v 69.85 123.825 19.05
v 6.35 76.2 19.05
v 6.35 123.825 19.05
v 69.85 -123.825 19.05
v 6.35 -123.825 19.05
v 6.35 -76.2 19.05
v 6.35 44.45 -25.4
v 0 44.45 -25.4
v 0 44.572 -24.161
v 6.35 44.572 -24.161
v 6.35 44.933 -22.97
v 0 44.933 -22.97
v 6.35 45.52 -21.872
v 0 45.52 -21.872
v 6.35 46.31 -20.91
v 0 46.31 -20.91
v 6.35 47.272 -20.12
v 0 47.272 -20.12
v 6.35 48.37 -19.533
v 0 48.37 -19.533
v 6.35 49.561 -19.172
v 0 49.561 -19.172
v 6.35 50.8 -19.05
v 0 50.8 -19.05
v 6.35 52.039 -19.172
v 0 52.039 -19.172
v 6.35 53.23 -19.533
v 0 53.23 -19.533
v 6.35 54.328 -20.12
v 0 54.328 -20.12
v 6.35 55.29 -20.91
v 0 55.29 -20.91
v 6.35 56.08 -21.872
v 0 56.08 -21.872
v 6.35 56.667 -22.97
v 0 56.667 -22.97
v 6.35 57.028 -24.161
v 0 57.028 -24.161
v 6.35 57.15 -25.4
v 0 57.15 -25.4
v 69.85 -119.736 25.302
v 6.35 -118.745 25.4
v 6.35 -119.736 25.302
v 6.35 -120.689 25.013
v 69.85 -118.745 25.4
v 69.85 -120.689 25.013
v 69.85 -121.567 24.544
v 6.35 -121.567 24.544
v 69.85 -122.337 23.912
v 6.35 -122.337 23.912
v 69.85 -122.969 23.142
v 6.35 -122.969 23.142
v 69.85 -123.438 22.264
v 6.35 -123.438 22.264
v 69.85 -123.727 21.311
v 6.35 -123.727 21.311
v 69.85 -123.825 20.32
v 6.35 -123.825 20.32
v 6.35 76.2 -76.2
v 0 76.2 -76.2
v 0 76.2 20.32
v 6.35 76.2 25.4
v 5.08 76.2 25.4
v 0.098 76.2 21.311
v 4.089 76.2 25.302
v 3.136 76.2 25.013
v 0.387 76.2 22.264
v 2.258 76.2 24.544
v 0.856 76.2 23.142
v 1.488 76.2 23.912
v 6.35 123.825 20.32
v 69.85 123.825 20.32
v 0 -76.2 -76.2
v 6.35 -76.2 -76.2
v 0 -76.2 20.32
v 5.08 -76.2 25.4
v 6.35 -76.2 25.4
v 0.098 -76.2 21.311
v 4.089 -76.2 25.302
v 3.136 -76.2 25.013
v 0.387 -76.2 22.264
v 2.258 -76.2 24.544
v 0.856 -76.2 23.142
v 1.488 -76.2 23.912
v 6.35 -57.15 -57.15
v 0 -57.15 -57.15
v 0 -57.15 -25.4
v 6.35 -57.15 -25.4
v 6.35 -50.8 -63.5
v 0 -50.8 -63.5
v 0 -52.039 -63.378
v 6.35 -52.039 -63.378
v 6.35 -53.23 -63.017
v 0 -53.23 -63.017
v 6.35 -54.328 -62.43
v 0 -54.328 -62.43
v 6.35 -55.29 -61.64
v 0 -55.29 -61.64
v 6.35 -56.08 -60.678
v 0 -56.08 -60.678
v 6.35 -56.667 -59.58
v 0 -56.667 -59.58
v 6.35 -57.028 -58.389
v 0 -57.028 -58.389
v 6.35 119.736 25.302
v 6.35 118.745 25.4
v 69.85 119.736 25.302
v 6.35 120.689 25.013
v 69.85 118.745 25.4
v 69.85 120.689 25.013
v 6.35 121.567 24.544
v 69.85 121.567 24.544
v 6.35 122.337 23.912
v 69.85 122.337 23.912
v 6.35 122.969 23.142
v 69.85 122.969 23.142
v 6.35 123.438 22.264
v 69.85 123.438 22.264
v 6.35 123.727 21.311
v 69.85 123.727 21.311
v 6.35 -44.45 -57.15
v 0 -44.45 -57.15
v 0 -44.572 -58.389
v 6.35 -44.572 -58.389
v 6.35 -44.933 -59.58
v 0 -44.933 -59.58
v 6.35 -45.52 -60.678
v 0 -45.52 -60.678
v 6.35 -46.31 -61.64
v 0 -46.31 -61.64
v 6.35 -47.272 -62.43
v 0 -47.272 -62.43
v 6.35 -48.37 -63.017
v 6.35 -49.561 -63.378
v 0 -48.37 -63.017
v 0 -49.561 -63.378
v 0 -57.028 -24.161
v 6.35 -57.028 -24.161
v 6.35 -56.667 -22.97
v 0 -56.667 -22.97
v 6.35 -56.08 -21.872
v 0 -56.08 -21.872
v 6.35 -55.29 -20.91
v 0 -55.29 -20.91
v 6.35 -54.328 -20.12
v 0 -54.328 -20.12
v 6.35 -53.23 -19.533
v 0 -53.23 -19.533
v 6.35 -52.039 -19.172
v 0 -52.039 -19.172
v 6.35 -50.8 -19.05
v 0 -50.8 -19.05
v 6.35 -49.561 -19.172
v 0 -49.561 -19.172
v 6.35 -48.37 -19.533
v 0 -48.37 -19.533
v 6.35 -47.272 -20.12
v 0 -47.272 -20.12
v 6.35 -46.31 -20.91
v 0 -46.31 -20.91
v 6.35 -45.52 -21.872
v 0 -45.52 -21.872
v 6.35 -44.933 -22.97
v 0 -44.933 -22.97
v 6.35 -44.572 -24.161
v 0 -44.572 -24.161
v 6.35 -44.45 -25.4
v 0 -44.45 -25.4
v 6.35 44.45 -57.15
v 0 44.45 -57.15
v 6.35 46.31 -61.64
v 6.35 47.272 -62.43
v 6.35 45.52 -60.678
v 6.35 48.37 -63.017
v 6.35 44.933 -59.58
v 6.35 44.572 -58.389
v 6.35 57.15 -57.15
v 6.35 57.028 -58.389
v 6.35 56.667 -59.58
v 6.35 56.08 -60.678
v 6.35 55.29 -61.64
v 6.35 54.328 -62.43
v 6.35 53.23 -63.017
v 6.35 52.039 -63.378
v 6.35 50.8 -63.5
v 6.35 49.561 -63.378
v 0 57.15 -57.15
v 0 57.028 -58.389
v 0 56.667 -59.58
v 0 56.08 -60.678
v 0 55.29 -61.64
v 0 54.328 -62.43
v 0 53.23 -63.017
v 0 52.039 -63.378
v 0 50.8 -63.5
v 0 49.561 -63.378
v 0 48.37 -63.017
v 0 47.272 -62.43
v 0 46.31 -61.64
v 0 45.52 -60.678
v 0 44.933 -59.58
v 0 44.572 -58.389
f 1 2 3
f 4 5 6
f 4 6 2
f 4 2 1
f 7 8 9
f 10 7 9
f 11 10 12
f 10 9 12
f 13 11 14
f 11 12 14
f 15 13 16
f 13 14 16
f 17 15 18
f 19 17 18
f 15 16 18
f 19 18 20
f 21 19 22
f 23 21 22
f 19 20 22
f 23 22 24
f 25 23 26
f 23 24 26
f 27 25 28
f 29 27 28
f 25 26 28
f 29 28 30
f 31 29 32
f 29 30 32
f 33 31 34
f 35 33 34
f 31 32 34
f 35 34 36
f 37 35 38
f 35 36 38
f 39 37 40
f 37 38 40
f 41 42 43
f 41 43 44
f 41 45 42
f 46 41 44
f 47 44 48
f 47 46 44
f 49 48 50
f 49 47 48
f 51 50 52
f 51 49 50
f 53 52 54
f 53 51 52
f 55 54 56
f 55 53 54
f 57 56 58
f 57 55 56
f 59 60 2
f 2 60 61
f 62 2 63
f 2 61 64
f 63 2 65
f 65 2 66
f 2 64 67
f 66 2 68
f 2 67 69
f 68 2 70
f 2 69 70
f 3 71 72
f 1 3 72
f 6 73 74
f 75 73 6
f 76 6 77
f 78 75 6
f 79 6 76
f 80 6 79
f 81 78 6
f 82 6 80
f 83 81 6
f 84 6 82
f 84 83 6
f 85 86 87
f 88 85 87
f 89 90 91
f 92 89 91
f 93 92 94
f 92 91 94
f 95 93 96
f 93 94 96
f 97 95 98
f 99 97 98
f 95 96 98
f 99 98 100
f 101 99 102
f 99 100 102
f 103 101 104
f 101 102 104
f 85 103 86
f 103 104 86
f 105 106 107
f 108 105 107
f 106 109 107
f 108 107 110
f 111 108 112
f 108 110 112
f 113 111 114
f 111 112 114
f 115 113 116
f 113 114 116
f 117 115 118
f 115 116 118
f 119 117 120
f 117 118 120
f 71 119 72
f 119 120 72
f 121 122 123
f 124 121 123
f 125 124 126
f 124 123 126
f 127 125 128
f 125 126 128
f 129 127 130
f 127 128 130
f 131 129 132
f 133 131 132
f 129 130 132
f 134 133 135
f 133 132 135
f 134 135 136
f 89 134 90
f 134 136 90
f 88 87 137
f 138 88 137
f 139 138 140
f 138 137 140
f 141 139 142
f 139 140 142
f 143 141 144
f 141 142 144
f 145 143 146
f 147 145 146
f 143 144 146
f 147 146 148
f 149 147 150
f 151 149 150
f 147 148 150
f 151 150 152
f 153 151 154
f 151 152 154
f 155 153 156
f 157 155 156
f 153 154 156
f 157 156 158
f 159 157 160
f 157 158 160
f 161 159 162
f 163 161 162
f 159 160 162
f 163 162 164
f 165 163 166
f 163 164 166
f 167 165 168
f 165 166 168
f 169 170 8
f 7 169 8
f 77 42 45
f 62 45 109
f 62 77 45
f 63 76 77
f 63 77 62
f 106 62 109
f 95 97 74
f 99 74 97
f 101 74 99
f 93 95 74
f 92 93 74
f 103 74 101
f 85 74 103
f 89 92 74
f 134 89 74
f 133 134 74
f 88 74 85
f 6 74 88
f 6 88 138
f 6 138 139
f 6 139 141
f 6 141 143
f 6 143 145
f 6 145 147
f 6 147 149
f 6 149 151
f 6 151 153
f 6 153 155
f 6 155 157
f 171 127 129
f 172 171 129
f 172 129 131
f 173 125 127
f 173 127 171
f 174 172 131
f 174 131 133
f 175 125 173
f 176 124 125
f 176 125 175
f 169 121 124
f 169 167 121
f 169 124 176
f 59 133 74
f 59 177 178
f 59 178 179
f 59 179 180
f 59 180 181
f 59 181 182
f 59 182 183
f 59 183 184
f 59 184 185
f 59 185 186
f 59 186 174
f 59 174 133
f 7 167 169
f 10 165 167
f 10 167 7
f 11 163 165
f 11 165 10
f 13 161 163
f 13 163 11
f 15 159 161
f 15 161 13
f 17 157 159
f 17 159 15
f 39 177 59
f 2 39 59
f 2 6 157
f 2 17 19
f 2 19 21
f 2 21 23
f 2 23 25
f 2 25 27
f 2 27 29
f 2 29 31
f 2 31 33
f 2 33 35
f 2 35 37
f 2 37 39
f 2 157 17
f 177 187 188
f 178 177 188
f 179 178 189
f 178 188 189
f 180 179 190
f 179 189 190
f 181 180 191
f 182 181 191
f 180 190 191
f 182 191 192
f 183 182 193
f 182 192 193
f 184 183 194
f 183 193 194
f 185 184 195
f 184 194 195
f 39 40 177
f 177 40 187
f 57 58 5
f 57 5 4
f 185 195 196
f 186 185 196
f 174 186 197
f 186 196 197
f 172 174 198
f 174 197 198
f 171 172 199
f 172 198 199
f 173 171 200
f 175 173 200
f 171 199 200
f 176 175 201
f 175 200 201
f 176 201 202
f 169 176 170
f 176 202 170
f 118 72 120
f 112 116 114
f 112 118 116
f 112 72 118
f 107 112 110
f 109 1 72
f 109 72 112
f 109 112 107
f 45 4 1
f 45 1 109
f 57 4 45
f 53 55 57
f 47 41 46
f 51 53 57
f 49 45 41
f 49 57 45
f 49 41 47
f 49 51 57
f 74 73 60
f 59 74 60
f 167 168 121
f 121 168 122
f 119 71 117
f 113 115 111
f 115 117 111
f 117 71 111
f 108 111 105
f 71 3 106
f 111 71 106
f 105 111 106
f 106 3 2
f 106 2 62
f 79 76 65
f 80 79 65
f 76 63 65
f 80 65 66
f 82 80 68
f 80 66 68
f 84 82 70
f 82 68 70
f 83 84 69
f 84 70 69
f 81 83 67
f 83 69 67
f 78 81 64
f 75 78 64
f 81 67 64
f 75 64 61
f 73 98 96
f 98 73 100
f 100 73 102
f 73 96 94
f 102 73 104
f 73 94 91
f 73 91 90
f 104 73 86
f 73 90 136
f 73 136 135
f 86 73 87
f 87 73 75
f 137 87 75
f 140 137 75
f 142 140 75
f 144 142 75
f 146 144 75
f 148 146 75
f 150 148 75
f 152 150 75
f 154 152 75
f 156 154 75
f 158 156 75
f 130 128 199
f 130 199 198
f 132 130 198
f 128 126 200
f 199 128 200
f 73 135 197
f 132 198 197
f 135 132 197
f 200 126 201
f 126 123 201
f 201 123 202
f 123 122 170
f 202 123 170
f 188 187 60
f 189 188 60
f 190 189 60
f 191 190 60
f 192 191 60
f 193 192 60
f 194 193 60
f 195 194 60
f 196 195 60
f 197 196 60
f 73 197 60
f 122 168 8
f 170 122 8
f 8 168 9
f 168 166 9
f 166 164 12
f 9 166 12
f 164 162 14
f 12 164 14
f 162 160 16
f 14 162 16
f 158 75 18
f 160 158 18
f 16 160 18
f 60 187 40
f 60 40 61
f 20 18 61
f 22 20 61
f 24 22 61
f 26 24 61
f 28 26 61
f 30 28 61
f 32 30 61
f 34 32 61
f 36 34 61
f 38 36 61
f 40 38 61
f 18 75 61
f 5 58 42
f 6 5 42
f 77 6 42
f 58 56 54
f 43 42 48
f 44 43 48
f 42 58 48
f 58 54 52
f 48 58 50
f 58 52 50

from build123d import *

# Parameters (mm, degrees)
F6_W     = 63.5
F6_H     = 6.35
F0_DEPTH = 123.825
F3_W     = 152.4
F3_H     = 101.6
F4_DEPTH = 6.35
F5_R     = 5.08


with BuildPart() as f0:
    # F6 (on Front) → F0 (new body)
    with BuildSketch(Plane.XZ):
        with Locations((38.1, 22.225)):
            Rectangle(F6_W, F6_H)
    extrude(amount=F0_DEPTH)

    # F1: F0 across plane


with BuildPart() as f0_1:
    add(f0.part)
    add(f0.part.mirror(Plane.XZ))

    # F2: F0 across plane


with BuildPart() as f0_2:
    add(f0_1.part)
    add(f0_1.part.mirror(Plane.XZ))

    # F3 (on Right) → F4 (join)
    with BuildSketch(Plane.YZ):
        with Locations((0, -25.4)):
            Rectangle(F3_W, F3_H)
        with BuildLine():
            ThreePointArc((-50.8, -63.5), (-55.2901280605, -61.6401280605), (-57.15, -57.15))
            Line((-57.15, -57.15), (-57.15, -25.4))
            ThreePointArc((-57.15, -25.4), (-50.8, -19.05), (-44.45, -25.4))
            Line((-44.45, -25.4), (-44.45, -57.15))
            ThreePointArc((-44.45, -57.15), (-46.3098719395, -61.6401280605), (-50.8, -63.5))
        make_face(mode=Mode.SUBTRACT)
        with BuildLine():
            ThreePointArc((50.8, -63.5), (46.3098719395, -61.6401280605), (44.45, -57.15))
            Line((44.45, -57.15), (44.45, -25.4))
            ThreePointArc((44.45, -25.4), (50.8, -19.05), (57.15, -25.4))
            Line((57.15, -25.4), (57.15, -57.15))
            ThreePointArc((57.15, -57.15), (55.2901280605, -61.6401280605), (50.8, -63.5))
        make_face(mode=Mode.SUBTRACT)
    extrude(amount=F4_DEPTH)

    # F5
    f5_edges = [f0_2.edges().sort_by_distance(p)[0] for p in [
        (0, 0, 25.4),
        (38.1, 123.825, 25.4),
        (38.1, -123.825, 25.4),
    ]]
    fillet(f5_edges, radius=F5_R)


solid = f0_2.part
